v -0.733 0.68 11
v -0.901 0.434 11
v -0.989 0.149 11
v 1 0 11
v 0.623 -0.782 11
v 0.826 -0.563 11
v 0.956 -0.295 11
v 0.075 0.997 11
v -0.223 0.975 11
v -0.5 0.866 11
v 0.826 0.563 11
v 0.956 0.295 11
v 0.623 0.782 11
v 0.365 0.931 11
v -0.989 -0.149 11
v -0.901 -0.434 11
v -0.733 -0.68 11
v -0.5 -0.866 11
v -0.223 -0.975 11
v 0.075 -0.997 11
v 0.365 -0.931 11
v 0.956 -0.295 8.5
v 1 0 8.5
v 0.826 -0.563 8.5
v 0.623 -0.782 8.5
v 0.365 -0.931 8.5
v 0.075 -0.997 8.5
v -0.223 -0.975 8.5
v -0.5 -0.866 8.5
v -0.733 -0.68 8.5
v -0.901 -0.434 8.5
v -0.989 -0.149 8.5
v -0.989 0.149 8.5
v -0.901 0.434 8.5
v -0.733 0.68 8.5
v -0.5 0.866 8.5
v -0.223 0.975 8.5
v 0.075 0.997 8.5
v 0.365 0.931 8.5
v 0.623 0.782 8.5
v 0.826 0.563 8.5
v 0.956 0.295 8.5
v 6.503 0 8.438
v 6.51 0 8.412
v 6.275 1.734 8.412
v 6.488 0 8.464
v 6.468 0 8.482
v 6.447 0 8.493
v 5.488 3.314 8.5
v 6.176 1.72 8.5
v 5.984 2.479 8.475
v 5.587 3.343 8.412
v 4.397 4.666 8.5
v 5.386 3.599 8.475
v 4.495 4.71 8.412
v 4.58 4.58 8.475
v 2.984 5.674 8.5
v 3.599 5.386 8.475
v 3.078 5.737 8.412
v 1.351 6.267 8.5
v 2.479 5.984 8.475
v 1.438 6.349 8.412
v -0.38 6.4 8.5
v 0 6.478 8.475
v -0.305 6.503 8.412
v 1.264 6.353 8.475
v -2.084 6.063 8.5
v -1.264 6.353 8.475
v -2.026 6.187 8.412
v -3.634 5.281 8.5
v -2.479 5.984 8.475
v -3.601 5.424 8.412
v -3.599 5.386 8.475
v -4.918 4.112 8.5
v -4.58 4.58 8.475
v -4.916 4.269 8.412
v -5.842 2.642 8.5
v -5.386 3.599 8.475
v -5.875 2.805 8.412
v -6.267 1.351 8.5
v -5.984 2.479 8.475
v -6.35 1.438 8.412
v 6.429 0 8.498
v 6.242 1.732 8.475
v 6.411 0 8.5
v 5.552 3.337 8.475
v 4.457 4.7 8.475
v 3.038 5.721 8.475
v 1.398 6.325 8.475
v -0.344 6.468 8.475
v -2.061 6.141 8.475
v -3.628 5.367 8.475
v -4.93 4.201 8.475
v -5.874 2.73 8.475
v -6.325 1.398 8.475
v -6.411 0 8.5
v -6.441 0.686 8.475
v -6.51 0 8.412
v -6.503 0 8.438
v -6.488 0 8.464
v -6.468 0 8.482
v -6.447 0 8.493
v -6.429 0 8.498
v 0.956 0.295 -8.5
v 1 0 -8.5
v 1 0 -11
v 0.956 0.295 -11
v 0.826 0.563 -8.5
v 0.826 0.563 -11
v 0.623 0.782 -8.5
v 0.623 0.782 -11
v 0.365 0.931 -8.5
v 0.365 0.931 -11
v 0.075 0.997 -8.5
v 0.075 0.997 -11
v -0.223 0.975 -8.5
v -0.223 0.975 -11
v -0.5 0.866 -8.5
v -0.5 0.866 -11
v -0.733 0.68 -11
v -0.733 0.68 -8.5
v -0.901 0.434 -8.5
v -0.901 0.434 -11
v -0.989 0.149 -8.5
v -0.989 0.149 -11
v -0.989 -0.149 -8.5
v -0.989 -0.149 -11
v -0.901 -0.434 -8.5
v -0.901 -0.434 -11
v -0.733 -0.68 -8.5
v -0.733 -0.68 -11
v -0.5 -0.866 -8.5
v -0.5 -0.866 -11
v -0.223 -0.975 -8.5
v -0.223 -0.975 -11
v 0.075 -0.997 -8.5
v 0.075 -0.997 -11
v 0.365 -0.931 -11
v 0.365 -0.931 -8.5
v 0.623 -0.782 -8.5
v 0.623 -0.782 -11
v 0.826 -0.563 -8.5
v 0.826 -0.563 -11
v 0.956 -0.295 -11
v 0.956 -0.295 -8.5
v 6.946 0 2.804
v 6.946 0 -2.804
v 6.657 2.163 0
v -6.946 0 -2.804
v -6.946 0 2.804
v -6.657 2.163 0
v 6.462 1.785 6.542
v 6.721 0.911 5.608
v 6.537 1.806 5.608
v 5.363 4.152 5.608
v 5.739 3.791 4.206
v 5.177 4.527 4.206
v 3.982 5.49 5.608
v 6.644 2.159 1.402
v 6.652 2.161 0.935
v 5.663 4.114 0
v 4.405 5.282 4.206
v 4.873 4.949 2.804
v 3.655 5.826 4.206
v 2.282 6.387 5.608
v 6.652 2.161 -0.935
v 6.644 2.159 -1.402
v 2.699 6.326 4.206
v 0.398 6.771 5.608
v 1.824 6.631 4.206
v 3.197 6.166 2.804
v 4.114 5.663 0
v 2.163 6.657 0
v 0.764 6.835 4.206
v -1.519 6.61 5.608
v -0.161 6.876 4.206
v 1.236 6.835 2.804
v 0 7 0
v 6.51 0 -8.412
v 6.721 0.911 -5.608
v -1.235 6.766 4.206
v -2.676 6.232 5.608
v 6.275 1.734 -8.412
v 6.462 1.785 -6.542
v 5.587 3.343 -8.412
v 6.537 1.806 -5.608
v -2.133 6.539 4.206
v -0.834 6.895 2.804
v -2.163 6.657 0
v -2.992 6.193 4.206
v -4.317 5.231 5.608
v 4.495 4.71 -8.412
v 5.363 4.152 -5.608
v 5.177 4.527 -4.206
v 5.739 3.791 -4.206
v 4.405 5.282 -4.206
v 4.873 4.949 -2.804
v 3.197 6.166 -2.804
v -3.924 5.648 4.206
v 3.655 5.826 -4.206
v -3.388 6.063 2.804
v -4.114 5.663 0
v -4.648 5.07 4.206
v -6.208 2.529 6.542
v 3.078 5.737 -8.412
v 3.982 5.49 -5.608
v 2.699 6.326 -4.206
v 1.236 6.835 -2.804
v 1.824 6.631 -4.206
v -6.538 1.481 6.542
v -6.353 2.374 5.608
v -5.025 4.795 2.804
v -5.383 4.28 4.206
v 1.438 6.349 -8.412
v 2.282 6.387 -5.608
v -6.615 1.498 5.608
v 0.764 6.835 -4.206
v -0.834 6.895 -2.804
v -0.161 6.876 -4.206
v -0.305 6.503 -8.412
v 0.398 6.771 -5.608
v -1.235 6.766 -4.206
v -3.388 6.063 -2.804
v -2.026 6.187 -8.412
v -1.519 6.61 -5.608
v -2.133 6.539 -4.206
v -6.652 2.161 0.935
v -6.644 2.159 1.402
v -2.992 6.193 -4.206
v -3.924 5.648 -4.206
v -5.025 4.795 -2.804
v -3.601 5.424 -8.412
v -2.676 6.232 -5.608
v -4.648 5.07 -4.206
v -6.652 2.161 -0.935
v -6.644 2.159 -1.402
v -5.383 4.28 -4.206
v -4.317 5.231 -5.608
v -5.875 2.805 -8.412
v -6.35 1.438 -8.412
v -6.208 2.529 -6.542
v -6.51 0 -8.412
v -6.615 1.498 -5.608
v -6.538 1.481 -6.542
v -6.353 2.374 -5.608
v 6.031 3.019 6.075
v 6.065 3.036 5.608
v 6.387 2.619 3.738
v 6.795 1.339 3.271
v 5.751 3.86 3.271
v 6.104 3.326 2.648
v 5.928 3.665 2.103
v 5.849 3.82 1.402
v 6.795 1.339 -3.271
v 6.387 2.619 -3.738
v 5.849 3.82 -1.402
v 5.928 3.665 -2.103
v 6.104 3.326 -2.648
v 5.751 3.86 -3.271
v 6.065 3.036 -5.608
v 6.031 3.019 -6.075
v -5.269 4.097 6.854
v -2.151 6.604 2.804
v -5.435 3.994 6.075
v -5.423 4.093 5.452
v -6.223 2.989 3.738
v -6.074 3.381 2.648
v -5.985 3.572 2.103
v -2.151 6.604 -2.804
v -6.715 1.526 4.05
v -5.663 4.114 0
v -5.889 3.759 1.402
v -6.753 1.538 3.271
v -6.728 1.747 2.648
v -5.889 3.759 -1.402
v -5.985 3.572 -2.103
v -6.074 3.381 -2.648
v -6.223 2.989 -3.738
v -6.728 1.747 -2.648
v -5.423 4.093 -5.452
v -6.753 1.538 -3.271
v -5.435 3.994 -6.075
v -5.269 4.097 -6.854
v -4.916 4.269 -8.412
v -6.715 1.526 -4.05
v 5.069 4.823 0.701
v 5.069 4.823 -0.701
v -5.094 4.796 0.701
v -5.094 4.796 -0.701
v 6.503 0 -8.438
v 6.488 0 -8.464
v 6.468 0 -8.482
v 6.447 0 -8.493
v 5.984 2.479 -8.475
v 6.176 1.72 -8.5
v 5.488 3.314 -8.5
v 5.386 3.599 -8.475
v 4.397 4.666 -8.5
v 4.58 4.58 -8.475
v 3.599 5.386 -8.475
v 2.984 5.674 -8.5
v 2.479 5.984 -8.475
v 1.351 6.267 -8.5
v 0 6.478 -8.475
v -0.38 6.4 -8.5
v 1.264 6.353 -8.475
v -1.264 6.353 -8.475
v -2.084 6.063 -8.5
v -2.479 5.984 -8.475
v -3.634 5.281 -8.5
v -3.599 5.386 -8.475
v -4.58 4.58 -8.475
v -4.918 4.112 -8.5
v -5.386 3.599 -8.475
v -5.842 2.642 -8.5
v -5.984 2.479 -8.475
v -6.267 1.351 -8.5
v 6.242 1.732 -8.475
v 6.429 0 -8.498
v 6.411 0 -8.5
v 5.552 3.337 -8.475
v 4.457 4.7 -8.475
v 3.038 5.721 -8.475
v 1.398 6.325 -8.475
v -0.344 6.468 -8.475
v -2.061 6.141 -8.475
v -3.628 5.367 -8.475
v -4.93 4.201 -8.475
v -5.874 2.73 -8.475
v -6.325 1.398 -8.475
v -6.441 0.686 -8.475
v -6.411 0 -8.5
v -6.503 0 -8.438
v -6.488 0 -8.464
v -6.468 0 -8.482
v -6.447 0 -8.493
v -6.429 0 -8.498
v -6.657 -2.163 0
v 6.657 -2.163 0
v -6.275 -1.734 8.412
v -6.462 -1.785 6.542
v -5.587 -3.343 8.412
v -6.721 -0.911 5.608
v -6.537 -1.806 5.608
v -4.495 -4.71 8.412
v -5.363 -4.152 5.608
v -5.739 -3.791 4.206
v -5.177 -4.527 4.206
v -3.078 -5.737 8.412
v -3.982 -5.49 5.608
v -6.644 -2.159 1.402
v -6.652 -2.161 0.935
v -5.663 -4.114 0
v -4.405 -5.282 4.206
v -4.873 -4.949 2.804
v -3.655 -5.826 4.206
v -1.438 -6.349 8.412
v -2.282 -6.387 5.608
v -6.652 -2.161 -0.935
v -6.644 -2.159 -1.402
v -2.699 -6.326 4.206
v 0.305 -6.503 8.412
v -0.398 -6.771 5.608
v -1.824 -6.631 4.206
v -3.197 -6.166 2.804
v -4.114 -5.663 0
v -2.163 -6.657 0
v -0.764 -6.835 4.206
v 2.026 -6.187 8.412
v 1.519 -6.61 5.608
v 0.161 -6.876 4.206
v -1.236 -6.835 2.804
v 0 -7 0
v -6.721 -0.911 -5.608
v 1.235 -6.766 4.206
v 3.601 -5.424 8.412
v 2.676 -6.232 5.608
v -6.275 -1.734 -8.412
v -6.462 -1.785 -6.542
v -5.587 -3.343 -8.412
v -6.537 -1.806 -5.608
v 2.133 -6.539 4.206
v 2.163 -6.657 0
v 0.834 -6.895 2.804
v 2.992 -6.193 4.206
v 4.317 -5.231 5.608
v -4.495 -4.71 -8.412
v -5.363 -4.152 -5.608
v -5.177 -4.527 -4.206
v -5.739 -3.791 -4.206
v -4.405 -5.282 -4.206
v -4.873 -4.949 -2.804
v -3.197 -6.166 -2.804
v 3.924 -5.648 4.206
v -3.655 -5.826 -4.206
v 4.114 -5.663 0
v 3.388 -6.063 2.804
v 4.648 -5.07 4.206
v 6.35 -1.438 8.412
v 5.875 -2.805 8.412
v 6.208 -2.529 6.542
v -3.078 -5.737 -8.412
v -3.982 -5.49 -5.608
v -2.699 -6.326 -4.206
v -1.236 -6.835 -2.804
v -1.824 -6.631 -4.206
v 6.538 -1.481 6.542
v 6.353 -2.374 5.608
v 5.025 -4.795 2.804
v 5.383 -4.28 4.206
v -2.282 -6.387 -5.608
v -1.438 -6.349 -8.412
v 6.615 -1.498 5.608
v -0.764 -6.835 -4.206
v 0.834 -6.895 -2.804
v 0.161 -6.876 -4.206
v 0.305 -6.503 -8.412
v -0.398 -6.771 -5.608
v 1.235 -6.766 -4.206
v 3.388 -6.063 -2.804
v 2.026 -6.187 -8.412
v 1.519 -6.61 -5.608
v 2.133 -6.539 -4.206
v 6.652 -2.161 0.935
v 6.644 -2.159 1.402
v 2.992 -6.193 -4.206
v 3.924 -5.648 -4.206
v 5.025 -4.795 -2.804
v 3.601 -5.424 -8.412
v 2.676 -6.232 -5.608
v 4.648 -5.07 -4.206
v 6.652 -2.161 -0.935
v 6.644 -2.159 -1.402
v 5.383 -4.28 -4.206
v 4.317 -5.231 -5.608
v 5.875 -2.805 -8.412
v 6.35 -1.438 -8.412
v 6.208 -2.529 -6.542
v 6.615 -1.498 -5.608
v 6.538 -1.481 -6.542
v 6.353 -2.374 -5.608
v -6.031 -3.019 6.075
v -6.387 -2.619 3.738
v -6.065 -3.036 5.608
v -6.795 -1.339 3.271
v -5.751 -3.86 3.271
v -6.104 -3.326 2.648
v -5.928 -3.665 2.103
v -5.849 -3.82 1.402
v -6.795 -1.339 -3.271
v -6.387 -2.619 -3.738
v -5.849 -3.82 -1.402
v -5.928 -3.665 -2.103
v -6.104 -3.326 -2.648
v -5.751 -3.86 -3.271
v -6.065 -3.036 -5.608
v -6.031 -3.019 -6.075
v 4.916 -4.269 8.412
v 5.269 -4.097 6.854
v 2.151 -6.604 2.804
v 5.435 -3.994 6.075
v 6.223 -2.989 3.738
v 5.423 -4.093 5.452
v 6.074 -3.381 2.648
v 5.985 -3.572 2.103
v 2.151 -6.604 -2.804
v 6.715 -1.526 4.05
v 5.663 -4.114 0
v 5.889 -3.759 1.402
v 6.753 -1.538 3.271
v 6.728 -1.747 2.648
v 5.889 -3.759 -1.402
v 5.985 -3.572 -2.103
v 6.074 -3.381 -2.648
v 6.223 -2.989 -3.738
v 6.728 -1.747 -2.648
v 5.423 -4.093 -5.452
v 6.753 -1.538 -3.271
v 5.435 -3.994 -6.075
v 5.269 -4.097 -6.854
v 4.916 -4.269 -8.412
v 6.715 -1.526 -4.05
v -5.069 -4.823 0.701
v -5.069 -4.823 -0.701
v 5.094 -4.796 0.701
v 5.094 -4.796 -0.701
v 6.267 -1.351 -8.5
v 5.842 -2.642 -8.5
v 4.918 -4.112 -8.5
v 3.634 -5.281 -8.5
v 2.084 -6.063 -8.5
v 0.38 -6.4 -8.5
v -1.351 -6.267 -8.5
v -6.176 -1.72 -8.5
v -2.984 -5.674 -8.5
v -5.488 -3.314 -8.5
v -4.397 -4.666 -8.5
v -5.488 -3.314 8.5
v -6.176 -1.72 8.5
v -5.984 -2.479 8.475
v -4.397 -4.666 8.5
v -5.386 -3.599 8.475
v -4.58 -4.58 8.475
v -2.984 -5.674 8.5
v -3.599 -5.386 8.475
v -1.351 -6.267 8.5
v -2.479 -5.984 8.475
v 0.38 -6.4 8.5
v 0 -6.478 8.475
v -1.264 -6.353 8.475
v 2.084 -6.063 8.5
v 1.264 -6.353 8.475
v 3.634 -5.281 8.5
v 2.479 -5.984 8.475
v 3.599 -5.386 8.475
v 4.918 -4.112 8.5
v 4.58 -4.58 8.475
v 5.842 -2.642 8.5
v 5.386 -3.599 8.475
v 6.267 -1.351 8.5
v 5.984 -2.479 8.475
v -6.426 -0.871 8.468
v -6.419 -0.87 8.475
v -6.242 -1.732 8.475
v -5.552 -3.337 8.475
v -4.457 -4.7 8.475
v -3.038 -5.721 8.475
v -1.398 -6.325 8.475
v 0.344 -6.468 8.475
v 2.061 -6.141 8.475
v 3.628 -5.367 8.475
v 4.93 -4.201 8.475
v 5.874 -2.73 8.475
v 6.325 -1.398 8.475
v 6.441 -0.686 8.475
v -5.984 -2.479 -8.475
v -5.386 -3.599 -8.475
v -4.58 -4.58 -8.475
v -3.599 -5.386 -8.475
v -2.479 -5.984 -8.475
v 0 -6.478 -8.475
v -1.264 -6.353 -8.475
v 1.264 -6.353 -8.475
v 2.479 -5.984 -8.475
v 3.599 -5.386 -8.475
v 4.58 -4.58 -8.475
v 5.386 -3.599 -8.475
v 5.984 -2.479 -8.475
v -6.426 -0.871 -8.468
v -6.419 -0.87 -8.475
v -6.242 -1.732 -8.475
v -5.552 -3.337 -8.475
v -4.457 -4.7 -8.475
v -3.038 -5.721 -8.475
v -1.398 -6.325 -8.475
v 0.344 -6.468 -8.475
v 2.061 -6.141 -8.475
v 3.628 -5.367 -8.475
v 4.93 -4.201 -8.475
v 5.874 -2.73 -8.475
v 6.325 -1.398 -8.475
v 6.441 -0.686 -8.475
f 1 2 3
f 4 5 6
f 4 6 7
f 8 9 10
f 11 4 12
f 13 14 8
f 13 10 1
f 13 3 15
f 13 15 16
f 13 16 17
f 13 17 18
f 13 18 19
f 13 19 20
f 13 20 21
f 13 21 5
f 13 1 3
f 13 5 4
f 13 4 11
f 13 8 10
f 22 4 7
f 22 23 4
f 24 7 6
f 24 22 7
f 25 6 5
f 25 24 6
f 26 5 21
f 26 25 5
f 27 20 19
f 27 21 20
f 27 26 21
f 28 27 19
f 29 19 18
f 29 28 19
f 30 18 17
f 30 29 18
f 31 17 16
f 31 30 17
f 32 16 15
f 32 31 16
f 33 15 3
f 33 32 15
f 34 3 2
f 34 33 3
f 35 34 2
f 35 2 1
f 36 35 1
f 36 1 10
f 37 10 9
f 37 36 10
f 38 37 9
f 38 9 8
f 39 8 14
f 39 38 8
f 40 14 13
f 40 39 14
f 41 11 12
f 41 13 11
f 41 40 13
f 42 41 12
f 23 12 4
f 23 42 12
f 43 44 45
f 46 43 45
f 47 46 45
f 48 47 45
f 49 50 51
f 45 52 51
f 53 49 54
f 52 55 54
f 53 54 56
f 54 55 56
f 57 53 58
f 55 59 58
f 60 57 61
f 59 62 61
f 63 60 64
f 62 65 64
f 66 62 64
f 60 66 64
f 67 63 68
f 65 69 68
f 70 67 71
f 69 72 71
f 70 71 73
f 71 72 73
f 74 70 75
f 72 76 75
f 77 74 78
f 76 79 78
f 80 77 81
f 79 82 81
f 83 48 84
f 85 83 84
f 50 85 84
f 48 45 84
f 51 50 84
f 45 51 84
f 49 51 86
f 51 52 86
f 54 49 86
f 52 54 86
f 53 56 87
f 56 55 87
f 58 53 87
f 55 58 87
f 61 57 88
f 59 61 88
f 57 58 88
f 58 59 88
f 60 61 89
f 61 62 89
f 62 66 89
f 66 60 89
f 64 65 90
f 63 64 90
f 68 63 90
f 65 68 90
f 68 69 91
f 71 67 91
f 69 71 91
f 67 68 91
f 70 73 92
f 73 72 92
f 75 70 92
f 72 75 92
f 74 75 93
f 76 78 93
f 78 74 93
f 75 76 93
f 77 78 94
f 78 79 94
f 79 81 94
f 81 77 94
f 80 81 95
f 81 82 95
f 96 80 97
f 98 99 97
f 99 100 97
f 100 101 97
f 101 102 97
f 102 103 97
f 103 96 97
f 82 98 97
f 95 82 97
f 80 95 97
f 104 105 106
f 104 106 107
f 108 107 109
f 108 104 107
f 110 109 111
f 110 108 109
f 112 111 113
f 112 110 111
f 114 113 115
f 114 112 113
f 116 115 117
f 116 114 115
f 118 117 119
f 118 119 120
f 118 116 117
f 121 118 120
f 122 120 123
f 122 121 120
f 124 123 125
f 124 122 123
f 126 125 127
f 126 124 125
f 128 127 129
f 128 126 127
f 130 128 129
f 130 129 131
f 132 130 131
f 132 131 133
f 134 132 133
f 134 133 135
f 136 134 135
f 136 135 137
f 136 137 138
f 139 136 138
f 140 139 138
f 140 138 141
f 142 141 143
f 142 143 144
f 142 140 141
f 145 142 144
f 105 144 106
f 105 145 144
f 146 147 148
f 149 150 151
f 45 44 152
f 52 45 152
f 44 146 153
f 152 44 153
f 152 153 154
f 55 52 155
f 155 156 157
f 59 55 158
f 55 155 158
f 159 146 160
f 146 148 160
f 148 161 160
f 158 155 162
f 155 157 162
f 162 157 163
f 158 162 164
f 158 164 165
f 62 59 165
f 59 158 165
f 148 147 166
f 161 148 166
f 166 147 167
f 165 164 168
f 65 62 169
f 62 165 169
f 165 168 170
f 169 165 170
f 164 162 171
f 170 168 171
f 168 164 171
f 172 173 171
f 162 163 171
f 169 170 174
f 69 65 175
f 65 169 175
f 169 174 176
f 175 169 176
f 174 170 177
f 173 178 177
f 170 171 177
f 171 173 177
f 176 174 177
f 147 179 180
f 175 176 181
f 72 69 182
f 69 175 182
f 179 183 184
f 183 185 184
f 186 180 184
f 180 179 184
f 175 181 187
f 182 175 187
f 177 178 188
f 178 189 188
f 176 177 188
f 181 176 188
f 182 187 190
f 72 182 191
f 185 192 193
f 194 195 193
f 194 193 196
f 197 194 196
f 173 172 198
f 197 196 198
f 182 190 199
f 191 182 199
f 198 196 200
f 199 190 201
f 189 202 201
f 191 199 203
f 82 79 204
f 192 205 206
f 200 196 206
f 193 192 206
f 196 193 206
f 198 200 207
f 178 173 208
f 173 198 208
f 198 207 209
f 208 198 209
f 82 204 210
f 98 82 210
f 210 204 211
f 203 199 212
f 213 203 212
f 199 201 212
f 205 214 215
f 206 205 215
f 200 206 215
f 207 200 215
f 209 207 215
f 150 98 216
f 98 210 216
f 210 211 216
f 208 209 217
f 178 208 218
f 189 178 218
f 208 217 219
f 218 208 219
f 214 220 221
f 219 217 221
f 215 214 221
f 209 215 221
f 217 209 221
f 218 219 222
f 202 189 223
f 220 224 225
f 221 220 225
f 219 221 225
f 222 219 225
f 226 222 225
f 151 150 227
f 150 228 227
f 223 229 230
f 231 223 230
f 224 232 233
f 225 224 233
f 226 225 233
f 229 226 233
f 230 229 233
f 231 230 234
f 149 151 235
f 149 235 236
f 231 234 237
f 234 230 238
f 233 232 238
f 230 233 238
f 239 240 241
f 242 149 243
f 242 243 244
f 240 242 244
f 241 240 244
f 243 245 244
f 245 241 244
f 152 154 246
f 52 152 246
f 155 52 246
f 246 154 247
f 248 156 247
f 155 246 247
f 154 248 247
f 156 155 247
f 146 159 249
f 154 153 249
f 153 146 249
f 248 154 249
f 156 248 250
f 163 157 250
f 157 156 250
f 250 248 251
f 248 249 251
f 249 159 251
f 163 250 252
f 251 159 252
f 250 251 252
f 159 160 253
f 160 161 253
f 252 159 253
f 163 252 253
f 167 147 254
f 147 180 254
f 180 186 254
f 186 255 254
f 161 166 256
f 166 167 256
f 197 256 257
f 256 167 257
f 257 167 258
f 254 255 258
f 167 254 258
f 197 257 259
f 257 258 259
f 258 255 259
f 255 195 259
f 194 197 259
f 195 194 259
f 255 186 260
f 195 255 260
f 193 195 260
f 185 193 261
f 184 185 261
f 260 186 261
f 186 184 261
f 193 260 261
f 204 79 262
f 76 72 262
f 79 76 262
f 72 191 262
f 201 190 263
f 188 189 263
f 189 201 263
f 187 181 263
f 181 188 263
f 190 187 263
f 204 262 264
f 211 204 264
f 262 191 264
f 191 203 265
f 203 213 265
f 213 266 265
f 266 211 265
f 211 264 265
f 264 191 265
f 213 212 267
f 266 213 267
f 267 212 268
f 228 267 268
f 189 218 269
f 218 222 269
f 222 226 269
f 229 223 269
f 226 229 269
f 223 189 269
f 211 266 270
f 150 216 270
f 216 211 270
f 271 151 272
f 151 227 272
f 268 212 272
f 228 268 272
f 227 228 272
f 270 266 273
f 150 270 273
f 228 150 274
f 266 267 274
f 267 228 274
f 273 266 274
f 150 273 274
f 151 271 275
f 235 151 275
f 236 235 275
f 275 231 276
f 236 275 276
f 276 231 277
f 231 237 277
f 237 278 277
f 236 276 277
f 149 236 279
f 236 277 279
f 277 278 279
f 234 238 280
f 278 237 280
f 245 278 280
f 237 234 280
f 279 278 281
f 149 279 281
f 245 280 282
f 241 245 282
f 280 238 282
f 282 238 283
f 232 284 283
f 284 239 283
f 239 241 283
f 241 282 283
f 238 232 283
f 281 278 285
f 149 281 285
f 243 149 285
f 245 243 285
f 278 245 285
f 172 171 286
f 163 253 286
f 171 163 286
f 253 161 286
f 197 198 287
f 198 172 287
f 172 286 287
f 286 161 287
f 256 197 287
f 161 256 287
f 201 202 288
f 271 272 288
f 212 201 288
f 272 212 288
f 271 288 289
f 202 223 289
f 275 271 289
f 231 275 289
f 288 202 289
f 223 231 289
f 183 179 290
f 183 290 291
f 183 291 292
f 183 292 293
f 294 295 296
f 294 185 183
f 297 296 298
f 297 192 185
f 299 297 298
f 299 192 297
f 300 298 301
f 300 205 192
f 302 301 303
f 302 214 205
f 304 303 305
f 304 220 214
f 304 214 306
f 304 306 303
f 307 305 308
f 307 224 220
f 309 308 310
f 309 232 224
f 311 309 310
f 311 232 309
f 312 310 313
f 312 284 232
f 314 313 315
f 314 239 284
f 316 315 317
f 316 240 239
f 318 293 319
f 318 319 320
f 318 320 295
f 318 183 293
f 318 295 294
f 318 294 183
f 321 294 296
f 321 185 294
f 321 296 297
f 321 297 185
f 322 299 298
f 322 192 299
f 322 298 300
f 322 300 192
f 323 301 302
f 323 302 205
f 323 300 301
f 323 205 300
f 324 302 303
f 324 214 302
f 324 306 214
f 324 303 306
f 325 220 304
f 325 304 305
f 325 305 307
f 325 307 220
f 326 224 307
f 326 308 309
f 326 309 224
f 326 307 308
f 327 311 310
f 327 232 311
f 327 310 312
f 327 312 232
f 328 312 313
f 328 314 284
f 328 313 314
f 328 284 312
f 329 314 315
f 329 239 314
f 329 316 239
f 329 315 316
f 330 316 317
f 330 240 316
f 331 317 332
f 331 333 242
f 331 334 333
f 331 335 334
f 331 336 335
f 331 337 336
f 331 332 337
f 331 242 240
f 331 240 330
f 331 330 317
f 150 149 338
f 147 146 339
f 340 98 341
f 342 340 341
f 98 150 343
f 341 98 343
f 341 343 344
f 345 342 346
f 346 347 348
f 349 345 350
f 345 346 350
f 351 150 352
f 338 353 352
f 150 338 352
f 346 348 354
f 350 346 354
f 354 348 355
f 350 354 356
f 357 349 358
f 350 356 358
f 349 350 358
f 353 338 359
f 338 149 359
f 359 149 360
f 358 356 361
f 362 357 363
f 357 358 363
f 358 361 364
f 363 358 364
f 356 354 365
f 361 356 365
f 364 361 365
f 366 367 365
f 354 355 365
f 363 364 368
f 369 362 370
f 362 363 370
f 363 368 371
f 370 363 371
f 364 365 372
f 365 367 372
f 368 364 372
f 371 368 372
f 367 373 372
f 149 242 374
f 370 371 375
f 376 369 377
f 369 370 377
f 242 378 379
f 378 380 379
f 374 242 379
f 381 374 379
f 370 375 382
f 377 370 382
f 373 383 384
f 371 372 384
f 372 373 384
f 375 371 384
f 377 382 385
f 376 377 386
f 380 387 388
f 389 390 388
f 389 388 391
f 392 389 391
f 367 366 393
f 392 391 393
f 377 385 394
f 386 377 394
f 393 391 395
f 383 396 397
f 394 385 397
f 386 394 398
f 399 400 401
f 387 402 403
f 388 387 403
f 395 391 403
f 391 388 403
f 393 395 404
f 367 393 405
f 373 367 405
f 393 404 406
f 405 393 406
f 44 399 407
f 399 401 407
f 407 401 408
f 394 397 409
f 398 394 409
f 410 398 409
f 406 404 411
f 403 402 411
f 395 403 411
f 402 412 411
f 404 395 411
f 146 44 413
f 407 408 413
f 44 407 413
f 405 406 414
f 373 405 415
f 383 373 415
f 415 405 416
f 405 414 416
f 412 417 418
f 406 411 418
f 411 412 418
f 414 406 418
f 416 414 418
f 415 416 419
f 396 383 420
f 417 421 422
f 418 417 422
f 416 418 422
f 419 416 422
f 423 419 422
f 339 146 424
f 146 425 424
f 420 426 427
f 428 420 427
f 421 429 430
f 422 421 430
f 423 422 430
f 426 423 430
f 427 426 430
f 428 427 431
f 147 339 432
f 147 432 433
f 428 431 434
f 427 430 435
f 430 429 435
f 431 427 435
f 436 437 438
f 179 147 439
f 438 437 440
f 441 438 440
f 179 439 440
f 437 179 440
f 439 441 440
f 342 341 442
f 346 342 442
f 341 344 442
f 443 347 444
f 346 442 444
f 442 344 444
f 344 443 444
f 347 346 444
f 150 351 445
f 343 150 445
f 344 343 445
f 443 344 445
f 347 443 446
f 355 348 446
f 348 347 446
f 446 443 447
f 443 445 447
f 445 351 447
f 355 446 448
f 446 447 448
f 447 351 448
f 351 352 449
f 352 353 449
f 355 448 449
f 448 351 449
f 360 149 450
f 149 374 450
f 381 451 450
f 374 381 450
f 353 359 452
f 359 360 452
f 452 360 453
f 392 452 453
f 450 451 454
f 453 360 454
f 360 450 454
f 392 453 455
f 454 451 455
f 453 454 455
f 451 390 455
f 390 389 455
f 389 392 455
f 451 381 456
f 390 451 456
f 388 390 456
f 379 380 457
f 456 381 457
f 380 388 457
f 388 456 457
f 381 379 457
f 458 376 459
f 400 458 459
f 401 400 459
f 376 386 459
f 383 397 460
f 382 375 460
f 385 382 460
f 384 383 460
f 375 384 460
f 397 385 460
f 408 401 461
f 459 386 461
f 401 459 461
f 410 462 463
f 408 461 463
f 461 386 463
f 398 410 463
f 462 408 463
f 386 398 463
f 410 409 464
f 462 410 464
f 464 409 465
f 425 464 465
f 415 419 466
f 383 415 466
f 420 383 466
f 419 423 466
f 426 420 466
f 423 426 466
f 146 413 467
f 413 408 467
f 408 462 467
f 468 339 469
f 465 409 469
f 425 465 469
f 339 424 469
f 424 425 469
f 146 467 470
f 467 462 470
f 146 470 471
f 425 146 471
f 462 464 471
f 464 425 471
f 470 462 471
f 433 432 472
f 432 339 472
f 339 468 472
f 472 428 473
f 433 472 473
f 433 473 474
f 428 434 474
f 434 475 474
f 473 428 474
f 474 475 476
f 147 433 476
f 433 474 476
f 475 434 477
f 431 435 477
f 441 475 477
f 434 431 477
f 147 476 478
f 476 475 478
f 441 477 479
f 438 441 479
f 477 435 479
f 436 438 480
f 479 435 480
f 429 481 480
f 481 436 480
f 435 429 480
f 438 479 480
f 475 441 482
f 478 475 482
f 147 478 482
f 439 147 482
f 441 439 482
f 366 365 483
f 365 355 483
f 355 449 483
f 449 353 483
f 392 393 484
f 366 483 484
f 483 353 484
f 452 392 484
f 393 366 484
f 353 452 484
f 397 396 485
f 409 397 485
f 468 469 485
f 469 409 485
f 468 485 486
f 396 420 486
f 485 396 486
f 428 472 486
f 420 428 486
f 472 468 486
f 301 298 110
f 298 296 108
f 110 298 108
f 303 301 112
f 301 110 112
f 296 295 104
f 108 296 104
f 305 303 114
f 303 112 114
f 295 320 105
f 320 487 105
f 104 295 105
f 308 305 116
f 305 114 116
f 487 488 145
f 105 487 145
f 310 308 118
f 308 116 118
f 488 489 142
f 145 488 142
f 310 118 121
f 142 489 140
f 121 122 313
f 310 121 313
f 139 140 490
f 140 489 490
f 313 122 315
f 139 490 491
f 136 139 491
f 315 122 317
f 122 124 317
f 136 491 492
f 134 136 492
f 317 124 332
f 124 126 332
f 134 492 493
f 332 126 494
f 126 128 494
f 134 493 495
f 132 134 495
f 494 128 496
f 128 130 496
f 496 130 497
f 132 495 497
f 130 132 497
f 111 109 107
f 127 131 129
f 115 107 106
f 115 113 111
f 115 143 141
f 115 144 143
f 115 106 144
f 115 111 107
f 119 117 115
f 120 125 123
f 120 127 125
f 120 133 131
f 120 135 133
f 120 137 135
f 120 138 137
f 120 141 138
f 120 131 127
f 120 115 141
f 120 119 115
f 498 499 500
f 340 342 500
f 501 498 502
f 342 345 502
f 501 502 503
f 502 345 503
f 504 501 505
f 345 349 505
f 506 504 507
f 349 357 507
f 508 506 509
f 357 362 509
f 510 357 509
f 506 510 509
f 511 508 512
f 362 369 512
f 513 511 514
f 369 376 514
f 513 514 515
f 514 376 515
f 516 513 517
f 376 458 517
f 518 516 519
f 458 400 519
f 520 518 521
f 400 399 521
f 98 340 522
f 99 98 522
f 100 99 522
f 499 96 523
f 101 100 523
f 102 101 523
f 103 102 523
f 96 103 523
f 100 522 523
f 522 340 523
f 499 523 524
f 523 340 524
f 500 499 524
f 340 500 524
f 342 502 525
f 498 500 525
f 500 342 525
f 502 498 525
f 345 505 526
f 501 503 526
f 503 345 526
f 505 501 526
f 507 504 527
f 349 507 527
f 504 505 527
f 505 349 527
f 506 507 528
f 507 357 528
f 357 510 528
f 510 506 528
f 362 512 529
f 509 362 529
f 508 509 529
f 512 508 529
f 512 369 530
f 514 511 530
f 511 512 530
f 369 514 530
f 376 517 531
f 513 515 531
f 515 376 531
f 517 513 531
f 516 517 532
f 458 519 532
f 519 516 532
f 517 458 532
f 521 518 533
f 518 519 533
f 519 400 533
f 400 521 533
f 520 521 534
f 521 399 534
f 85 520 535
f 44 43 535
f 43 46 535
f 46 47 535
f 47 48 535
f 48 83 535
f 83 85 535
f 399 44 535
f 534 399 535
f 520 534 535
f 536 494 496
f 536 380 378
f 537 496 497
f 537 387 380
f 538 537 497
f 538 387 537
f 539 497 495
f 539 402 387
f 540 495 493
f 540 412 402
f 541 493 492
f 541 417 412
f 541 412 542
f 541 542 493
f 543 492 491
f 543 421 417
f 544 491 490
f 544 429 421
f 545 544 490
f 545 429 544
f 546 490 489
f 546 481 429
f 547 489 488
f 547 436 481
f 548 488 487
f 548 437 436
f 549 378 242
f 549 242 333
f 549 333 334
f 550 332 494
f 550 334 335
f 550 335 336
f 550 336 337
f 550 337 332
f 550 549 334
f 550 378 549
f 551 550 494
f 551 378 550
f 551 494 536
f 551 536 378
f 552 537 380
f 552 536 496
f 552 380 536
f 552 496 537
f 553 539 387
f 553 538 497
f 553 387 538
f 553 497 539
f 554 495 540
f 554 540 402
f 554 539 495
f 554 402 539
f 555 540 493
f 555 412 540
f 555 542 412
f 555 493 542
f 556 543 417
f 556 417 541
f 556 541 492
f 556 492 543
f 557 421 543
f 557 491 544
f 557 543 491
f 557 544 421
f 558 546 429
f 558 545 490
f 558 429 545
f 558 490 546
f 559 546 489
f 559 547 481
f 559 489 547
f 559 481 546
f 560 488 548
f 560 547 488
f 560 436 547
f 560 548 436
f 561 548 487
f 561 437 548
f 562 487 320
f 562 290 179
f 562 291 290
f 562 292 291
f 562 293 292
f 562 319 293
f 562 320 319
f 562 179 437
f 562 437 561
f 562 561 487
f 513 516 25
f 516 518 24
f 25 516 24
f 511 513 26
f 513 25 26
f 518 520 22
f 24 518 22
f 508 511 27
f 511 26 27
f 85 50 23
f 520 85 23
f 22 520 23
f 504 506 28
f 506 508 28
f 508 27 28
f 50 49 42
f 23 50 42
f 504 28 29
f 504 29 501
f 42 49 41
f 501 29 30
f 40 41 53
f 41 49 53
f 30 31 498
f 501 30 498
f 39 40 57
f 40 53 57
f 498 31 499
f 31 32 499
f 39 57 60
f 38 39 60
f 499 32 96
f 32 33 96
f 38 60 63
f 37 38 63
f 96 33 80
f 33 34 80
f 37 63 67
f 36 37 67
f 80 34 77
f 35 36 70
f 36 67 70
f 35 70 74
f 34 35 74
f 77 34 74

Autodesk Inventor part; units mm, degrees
ref_plane "YZ Plane" through (0, 0, 0) normal (1, 0, 0) x (0, 1, 0)
ref_plane "XZ Plane" through (0, 0, 0) normal (0, 1, 0) x (-1, 0, 0)
sketch "Sketch1" plane through (0, 0, 0) normal (1, 0, 0) x (0, 1, 0)
  line L0 (0, 0) -> (0, -8.5)
  line L1 (0, 0) -> (0, 8.5)
  dimension "d0" = 8.5
  dimension "d1" = 8.5
ref_plane "Work Plane3" through (0, 0, 0) normal (0, 0, 1) x (1, 0, 0)
ref_plane "Work Plane1" through (0, 0, 8.5) normal (0, 0, 1) x (1, 0, 0)
ref_plane "Work Plane2" through (0, 0, -8.5) normal (0, 0, -1) x (-1, 0, 0)
sketch "Sketch2" plane through (0, 0, 8.5) normal (0, 0, 1) x (1, 0, 0)
  circle A0 centre (0, 0) radius 6.5
  dimension "d2" = 13
sketch "Sketch3" plane through (0, 0, 0) normal (0, 0, 1) x (1, 0, 0)
  circle A0 centre (0, 0) radius 7
  dimension "d3" = 14
sketch "Sketch4" plane through (0, 0, -8.5) normal (0, 0, -1) x (-1, 0, 0)
  circle A0 centre (0, 0) radius 6.5
  dimension "d4" = 13
loft "Loft1" add profiles "Sketch2", "Sketch3", "Sketch4"
fillet "Fillet1" radius 0.1 4 edges at (0, 6.5, 8.5) (0, -6.5, 8.5) (0, 6.5, -8.5) (0, -6.5, -8.5)
sketch "Sketch5" plane through (0.0059, 0.0026, 8.5) normal (0, 0, 1) x (1, 0, 0)
  circle A0 centre (-0.0059, -0.0026) radius 1
  dimension "d12" = 2
extrude "Extrusion1" add sketch "Sketch5" along normal blind 4.2
mirror "Mirror1" about plane through (0, 0, 0) normal (0, 0, 1) of "Extrusion1"
sketch "Sketch6" plane through (0, 0, 12.7) normal (0, 0, 1) x (1, 0, 0)
  circle A0 centre (0, 0) radius 1 projected
extrude "Extrusion2" cut sketch "Sketch6" against normal blind 1.7
sketch "Sketch7" plane through (0, 0, -12.7) normal (0, 0, -1) x (-1, 0, 0)
  circle A0 centre (0, 0) radius 1 projected
extrude "Extrusion3" cut sketch "Sketch7" against normal blind 1.7
properties part number "Mechnum small wheel"
